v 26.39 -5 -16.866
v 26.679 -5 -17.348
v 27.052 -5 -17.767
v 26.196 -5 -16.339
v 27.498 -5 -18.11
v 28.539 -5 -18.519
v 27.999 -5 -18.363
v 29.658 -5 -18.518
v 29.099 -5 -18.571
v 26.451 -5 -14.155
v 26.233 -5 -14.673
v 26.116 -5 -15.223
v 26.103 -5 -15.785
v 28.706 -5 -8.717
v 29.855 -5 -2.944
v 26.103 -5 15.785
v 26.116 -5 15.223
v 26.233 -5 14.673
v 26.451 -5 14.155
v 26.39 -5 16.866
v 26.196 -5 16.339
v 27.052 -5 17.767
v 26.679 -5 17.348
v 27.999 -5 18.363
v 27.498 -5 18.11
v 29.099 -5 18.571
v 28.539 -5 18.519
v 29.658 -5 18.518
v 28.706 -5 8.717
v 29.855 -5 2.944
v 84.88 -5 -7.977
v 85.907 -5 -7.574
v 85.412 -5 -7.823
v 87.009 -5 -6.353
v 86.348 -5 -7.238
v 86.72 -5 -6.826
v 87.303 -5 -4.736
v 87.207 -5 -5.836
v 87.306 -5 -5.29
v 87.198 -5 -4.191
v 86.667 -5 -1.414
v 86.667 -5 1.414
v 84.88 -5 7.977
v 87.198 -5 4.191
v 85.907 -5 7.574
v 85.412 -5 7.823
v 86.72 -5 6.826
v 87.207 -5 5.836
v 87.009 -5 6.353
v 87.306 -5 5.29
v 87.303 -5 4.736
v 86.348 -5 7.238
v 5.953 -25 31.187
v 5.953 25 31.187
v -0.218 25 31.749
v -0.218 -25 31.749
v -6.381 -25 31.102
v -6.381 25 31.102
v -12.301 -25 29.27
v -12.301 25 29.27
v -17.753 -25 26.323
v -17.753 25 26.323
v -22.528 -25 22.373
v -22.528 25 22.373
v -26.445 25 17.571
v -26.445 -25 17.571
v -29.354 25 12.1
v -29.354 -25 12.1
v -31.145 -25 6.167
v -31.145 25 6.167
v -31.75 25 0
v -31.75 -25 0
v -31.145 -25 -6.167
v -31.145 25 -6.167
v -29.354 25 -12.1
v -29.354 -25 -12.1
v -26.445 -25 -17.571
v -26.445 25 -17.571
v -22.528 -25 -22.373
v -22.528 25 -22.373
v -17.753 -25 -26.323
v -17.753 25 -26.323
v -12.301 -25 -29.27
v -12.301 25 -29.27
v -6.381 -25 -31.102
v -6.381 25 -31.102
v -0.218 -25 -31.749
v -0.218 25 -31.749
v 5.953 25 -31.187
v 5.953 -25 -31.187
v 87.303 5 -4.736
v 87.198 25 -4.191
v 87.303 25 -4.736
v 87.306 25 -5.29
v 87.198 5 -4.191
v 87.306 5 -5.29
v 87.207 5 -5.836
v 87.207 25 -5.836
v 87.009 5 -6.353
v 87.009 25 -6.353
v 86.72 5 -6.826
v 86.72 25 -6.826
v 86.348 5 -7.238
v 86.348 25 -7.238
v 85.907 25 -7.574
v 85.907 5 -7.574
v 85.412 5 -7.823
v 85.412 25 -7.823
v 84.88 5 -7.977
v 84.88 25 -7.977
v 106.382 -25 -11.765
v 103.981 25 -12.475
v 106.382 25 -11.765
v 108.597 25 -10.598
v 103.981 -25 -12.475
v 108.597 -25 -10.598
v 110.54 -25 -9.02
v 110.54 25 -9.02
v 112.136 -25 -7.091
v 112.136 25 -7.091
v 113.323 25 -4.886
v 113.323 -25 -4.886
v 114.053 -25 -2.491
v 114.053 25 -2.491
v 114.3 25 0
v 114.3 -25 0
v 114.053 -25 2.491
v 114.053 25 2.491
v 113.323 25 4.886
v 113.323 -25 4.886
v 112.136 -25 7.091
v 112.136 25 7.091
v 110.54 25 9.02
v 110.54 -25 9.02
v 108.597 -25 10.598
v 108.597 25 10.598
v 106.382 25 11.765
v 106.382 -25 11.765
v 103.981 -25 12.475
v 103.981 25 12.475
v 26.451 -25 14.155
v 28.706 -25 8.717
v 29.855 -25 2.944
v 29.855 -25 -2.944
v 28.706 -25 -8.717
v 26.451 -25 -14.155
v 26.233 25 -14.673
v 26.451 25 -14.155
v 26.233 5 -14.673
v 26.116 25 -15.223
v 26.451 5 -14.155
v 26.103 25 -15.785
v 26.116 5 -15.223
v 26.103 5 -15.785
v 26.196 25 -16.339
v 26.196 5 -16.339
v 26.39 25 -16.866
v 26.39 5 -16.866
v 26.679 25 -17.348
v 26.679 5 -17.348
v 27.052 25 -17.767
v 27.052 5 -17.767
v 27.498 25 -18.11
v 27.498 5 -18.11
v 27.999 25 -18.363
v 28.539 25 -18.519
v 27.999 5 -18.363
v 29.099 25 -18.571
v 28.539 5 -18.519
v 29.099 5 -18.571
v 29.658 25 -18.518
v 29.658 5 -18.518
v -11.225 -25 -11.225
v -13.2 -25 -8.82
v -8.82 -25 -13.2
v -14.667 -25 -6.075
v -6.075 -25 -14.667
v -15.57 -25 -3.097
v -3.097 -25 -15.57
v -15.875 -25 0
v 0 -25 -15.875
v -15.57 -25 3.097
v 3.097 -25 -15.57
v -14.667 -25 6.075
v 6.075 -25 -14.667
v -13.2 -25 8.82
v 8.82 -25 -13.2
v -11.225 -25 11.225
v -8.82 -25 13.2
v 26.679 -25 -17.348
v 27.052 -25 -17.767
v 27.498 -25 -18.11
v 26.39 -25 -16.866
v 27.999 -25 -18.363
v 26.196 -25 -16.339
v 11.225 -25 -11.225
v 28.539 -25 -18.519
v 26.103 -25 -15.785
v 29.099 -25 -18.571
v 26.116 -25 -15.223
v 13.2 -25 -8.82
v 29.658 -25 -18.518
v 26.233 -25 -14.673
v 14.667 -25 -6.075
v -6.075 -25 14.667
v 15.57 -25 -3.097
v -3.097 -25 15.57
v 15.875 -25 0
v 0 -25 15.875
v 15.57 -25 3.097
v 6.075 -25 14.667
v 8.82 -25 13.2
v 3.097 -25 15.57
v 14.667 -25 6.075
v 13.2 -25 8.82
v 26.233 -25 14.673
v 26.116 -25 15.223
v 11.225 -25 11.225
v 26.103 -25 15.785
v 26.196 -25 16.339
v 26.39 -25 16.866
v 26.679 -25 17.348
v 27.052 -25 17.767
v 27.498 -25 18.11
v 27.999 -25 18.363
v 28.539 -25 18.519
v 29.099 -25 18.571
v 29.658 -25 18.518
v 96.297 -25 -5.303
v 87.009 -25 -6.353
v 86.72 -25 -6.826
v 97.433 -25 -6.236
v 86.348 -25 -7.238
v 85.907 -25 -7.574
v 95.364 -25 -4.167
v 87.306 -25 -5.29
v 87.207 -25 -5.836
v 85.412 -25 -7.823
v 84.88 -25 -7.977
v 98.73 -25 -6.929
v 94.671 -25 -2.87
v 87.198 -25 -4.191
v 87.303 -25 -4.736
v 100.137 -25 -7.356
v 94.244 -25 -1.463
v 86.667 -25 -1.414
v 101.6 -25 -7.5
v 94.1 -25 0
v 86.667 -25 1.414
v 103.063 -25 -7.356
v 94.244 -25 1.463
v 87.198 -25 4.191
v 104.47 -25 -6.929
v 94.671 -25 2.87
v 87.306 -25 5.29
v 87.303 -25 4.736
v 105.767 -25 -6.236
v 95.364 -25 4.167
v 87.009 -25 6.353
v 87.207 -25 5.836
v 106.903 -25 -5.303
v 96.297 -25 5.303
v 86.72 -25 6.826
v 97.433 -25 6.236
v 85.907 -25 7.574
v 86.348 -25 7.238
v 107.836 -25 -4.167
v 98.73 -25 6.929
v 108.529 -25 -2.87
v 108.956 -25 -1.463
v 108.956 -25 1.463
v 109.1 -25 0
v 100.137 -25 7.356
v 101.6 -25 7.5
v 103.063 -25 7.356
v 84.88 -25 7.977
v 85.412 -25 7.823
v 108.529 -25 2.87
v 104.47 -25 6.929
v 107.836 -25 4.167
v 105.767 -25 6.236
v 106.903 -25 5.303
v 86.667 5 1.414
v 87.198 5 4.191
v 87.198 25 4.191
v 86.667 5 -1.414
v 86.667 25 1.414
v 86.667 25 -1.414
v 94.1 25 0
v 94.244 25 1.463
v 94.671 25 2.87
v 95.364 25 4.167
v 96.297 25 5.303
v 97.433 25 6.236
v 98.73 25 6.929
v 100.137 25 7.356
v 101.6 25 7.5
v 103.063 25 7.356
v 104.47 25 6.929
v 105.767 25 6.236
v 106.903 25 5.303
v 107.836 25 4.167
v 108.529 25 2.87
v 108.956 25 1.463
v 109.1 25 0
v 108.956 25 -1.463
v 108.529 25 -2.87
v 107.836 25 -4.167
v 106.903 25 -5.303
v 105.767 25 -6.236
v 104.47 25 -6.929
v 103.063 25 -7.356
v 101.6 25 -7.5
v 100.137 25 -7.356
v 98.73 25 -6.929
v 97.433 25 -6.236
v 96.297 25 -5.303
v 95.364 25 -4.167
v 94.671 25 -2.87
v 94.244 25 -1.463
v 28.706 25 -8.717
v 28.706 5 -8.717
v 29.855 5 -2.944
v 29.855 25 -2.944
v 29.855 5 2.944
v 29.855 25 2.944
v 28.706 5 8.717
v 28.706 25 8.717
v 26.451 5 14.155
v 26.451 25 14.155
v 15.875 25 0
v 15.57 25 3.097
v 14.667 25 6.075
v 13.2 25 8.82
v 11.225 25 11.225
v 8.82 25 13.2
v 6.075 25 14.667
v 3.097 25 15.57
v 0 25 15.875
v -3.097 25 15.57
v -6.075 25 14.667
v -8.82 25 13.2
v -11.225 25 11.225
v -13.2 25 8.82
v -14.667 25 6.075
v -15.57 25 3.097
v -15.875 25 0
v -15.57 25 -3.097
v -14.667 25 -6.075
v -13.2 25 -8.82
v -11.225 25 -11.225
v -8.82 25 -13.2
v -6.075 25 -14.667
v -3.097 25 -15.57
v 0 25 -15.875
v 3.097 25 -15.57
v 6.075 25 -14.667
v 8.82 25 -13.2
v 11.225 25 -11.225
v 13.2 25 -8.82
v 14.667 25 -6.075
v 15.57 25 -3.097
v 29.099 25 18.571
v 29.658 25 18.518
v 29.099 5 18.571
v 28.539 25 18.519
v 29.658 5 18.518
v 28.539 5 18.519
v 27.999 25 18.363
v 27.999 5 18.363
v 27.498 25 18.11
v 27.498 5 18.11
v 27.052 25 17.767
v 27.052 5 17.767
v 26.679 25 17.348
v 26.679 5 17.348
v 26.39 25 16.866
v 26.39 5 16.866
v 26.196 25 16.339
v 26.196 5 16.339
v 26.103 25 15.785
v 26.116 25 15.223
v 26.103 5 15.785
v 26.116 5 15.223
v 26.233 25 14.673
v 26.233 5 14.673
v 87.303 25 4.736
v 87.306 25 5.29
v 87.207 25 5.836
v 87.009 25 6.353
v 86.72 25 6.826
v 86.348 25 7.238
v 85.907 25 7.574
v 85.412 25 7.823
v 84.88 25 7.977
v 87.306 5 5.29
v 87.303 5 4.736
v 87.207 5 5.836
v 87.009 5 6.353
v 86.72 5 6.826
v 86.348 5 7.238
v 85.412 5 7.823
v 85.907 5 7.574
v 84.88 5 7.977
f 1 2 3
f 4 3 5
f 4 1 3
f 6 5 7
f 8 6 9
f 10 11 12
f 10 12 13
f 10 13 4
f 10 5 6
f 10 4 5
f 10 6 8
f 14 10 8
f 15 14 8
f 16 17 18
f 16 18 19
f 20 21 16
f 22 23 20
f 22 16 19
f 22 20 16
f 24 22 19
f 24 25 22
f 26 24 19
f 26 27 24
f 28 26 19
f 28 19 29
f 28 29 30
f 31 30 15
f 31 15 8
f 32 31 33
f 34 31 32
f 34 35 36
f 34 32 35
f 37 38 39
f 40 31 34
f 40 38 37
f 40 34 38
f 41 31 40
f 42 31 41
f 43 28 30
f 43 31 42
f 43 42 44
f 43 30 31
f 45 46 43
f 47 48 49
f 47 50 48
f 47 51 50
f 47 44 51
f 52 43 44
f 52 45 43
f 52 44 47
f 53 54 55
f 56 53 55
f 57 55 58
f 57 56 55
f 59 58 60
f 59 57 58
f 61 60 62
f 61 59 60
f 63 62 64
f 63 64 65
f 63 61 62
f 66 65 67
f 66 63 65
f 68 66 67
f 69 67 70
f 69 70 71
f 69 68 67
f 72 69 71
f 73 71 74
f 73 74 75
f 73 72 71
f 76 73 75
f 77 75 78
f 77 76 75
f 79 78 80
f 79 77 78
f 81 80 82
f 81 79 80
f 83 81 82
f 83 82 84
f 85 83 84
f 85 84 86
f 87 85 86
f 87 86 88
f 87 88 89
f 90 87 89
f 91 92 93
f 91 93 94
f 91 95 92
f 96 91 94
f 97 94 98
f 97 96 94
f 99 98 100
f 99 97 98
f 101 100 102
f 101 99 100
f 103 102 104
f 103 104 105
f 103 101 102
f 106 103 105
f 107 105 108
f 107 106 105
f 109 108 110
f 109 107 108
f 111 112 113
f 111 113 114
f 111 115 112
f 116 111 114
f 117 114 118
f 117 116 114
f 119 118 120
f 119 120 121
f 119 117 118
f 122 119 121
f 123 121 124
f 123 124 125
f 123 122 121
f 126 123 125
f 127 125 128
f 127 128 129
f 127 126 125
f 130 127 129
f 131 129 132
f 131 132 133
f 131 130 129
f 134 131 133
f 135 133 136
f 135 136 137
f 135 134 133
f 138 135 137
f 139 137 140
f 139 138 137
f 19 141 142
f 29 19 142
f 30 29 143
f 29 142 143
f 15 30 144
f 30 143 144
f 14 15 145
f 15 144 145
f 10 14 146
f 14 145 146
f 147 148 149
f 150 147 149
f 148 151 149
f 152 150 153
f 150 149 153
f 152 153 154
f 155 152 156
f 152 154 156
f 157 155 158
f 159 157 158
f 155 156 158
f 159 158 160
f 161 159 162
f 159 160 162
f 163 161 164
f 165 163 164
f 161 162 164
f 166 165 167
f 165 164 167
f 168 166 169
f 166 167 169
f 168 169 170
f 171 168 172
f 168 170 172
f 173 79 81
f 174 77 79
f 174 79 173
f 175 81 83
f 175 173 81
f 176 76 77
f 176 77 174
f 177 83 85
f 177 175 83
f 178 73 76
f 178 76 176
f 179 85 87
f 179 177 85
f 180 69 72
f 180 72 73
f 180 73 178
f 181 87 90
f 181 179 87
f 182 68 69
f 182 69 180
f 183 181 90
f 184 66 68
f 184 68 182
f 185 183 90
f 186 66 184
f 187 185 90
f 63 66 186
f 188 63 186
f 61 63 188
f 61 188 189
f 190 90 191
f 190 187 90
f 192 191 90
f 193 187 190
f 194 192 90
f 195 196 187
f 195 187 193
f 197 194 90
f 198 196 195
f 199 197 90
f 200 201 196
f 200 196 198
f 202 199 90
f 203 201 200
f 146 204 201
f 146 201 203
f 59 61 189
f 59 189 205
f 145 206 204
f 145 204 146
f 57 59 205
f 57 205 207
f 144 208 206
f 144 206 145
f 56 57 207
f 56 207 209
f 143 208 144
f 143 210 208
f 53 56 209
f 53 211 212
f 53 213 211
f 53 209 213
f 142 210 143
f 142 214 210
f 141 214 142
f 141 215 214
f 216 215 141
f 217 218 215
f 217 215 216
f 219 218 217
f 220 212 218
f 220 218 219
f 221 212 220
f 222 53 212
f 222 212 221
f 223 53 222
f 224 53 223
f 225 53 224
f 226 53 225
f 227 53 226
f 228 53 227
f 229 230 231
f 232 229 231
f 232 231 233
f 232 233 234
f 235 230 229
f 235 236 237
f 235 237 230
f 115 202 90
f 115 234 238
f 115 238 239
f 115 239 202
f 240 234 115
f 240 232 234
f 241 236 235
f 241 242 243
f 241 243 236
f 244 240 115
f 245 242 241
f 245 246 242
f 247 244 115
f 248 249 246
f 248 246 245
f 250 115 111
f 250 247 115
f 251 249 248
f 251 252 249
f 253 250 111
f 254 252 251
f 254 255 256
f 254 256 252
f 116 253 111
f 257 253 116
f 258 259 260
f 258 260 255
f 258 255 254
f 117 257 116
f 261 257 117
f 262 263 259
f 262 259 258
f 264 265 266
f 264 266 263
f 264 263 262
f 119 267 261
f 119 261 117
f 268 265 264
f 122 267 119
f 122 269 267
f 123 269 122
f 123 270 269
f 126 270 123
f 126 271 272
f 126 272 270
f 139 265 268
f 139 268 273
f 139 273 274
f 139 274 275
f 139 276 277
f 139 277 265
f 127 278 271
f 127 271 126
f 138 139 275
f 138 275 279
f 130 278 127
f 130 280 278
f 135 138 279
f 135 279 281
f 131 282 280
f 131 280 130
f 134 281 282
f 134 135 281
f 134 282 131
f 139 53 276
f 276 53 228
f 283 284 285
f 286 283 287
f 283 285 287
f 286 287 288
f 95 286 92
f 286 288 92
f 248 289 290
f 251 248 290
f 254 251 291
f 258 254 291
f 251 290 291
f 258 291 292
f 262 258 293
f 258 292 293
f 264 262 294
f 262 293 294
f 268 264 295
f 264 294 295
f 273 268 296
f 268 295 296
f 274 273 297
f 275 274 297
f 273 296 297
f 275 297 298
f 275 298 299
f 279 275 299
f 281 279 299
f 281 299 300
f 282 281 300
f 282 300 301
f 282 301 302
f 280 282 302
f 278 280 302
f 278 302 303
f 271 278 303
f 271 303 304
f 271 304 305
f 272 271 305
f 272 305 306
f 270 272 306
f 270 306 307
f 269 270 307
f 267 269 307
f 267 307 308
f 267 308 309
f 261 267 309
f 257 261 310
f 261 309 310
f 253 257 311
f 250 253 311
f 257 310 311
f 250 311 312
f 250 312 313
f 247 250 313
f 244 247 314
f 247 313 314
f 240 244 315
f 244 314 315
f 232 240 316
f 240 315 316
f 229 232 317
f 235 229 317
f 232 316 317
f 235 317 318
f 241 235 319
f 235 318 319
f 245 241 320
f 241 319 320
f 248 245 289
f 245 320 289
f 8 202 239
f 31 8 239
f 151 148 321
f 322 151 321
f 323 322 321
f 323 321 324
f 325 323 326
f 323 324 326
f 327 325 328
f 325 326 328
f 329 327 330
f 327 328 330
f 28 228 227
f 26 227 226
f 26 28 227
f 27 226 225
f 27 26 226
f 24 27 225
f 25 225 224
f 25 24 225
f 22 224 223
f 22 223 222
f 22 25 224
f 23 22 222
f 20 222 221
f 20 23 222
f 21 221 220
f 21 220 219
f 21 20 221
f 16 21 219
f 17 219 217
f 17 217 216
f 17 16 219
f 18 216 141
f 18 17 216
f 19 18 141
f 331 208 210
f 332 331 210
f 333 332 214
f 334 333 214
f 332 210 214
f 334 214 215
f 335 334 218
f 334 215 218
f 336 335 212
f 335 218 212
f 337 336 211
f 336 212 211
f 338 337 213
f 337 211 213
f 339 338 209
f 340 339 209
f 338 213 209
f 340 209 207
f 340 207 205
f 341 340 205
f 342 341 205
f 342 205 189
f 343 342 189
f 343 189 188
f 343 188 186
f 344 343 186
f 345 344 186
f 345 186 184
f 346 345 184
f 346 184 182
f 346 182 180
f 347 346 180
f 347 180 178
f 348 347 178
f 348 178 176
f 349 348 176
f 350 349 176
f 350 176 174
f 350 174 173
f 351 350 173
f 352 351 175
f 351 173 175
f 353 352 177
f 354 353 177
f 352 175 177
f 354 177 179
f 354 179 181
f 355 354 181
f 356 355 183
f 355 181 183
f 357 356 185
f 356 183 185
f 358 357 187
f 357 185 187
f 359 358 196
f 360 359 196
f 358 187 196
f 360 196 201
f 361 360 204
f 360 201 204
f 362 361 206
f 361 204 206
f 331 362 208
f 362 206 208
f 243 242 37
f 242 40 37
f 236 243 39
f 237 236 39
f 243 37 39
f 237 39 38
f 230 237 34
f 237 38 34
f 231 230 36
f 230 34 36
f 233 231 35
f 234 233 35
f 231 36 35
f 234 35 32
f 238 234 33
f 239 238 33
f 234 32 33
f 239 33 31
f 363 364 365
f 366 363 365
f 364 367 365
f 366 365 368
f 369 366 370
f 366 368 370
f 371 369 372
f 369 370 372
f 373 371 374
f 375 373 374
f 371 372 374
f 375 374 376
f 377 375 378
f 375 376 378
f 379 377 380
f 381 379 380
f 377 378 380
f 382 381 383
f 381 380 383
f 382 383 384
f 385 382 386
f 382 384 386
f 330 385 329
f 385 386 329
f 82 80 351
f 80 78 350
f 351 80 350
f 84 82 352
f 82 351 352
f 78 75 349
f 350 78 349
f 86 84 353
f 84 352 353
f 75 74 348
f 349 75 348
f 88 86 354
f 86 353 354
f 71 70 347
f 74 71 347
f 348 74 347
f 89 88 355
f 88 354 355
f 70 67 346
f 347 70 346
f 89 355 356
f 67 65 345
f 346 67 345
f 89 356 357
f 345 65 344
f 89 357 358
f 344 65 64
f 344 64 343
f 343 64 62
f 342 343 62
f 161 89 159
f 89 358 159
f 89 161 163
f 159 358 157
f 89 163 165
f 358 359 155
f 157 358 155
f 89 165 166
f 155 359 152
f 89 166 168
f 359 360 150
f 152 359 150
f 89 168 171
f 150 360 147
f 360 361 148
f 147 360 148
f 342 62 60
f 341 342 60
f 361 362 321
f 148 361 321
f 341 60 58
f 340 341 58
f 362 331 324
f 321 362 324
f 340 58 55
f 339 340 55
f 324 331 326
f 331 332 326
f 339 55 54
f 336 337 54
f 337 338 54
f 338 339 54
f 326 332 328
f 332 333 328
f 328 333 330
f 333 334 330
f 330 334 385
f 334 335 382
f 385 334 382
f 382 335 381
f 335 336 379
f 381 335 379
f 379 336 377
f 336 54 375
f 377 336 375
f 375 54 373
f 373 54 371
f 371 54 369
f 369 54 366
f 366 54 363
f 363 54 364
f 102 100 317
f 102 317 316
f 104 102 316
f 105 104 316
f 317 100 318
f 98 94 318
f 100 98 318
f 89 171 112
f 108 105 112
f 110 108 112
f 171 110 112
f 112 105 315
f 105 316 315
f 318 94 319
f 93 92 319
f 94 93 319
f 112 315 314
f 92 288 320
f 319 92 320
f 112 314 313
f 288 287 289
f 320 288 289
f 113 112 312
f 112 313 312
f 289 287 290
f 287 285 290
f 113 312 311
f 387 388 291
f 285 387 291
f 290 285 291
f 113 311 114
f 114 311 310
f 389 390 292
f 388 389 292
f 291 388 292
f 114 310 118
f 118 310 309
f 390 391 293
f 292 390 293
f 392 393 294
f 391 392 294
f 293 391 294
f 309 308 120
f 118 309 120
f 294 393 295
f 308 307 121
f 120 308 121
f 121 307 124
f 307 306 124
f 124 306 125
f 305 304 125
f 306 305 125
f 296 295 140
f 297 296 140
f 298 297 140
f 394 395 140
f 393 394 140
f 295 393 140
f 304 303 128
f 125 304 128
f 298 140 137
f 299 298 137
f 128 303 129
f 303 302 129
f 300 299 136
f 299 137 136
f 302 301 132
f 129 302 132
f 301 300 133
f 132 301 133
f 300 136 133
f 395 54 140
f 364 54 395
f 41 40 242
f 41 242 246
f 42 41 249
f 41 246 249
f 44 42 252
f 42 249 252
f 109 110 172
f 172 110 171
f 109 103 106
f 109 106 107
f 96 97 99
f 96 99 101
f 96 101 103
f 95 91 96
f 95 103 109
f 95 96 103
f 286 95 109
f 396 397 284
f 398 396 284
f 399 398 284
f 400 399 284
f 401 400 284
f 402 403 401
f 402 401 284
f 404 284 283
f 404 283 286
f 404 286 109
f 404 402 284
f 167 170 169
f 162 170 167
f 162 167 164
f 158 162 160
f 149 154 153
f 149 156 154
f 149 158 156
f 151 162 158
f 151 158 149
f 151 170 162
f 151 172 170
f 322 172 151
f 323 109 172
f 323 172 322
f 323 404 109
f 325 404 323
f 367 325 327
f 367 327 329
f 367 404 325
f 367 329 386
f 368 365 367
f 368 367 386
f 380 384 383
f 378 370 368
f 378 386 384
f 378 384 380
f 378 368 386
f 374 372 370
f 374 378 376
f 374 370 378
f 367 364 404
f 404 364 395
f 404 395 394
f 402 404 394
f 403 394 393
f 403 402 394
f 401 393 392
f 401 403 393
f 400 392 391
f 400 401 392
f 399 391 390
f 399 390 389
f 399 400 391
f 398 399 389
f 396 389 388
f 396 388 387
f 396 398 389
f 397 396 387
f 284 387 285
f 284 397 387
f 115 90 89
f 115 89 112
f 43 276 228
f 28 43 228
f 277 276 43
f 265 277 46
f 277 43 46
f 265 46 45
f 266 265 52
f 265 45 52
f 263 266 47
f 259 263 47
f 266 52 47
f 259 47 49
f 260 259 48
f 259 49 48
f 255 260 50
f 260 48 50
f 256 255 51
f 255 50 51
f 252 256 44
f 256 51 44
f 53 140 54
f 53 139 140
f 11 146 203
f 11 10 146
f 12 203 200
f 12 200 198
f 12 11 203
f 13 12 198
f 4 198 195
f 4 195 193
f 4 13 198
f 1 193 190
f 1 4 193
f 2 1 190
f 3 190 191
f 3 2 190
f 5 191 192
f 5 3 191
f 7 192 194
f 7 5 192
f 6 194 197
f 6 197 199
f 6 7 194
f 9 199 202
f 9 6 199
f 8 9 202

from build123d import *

# Parameters (mm, degrees)
F1_DEPTH = 25
F3_D     = 15
F4_R     = 15.875
F5_DEPTH = 50.001
F7_DEPTH = 20
F9_DEPTH = 20
F10_R    = 3
F11_R    = 3


with BuildPart() as f1:
    # F0 (on Front) → F1 (new body, symmetric)
    with BuildSketch(Plane.XZ):
        with BuildLine():
            Line((103.98125, 12.47476), (5.953125, 31.186901))
            ThreePointArc((5.953125, 31.186901), (-31.75, 0), (5.953125, -31.186901))
            Line((5.953125, -31.186901), (103.98125, -12.47476))
            ThreePointArc((103.98125, -12.47476), (114.3, 0), (103.98125, 12.47476))
        make_face()
    extrude(amount=F1_DEPTH, both=True)

    # F3 (through all)
    with Locations(Plane.XZ.offset(25)):
        with Locations((101.6, 0)):
            Hole(F3_D / 2)

    # F4 (on face) → F5 (cut, through all)
    with BuildSketch(Plane.XZ.offset(25)):
        Circle(F4_R)
    extrude(amount=-F5_DEPTH, mode=Mode.SUBTRACT)

    # F6 (on face) → F7 (cut)
    with BuildSketch(Plane.XZ.offset(25)):
        with BuildLine():
            Line((88.489236, 7.287515), (22.456658, 19.892172))
            ThreePointArc((22.456658, 19.892172), (30, 0), (22.456658, -19.892172))
            Line((22.456658, -19.892172), (88.489236, -7.287515))
            ThreePointArc((88.489236, -7.287515), (86.6, 0), (88.489236, 7.287515))
        make_face()
    extrude(amount=-F7_DEPTH, mode=Mode.SUBTRACT)

    # F8 (on face) → F9 (cut)
    with BuildSketch(Plane(origin=(0, 25, 0), x_dir=(-1, 0, 0), z_dir=(0, 1, 0))):
        with BuildLine():
            Line((-88.489236, -7.287515), (-22.456658, -19.892172))
            ThreePointArc((-22.456658, -19.892172), (-30, 0), (-22.456658, 19.892172))
            Line((-22.456658, 19.892172), (-88.489236, 7.287515))
            ThreePointArc((-88.489236, 7.287515), (-86.6, 0), (-88.489236, -7.287515))
        make_face()
    extrude(amount=-F9_DEPTH, mode=Mode.SUBTRACT)

    # F10
    f10_edges = [f1.edges().sort_by_distance(p)[0] for p in [
        (22.456658, -15, -19.892172),
        (22.456658, -15, 19.892172),
        (22.456658, 15, 19.892172),
        (22.456658, 15, -19.892172),
    ]]
    fillet(f10_edges, radius=F10_R)

    # F11
    f11_edges = [f1.edges().sort_by_distance(p)[0] for p in [
        (88.489236, 15, -7.287515),
        (88.489236, 15, 7.287515),
        (88.489236, -15, 7.287515),
        (88.489236, -15, -7.287515),
    ]]
    fillet(f11_edges, radius=F11_R)


solid = f1.part
